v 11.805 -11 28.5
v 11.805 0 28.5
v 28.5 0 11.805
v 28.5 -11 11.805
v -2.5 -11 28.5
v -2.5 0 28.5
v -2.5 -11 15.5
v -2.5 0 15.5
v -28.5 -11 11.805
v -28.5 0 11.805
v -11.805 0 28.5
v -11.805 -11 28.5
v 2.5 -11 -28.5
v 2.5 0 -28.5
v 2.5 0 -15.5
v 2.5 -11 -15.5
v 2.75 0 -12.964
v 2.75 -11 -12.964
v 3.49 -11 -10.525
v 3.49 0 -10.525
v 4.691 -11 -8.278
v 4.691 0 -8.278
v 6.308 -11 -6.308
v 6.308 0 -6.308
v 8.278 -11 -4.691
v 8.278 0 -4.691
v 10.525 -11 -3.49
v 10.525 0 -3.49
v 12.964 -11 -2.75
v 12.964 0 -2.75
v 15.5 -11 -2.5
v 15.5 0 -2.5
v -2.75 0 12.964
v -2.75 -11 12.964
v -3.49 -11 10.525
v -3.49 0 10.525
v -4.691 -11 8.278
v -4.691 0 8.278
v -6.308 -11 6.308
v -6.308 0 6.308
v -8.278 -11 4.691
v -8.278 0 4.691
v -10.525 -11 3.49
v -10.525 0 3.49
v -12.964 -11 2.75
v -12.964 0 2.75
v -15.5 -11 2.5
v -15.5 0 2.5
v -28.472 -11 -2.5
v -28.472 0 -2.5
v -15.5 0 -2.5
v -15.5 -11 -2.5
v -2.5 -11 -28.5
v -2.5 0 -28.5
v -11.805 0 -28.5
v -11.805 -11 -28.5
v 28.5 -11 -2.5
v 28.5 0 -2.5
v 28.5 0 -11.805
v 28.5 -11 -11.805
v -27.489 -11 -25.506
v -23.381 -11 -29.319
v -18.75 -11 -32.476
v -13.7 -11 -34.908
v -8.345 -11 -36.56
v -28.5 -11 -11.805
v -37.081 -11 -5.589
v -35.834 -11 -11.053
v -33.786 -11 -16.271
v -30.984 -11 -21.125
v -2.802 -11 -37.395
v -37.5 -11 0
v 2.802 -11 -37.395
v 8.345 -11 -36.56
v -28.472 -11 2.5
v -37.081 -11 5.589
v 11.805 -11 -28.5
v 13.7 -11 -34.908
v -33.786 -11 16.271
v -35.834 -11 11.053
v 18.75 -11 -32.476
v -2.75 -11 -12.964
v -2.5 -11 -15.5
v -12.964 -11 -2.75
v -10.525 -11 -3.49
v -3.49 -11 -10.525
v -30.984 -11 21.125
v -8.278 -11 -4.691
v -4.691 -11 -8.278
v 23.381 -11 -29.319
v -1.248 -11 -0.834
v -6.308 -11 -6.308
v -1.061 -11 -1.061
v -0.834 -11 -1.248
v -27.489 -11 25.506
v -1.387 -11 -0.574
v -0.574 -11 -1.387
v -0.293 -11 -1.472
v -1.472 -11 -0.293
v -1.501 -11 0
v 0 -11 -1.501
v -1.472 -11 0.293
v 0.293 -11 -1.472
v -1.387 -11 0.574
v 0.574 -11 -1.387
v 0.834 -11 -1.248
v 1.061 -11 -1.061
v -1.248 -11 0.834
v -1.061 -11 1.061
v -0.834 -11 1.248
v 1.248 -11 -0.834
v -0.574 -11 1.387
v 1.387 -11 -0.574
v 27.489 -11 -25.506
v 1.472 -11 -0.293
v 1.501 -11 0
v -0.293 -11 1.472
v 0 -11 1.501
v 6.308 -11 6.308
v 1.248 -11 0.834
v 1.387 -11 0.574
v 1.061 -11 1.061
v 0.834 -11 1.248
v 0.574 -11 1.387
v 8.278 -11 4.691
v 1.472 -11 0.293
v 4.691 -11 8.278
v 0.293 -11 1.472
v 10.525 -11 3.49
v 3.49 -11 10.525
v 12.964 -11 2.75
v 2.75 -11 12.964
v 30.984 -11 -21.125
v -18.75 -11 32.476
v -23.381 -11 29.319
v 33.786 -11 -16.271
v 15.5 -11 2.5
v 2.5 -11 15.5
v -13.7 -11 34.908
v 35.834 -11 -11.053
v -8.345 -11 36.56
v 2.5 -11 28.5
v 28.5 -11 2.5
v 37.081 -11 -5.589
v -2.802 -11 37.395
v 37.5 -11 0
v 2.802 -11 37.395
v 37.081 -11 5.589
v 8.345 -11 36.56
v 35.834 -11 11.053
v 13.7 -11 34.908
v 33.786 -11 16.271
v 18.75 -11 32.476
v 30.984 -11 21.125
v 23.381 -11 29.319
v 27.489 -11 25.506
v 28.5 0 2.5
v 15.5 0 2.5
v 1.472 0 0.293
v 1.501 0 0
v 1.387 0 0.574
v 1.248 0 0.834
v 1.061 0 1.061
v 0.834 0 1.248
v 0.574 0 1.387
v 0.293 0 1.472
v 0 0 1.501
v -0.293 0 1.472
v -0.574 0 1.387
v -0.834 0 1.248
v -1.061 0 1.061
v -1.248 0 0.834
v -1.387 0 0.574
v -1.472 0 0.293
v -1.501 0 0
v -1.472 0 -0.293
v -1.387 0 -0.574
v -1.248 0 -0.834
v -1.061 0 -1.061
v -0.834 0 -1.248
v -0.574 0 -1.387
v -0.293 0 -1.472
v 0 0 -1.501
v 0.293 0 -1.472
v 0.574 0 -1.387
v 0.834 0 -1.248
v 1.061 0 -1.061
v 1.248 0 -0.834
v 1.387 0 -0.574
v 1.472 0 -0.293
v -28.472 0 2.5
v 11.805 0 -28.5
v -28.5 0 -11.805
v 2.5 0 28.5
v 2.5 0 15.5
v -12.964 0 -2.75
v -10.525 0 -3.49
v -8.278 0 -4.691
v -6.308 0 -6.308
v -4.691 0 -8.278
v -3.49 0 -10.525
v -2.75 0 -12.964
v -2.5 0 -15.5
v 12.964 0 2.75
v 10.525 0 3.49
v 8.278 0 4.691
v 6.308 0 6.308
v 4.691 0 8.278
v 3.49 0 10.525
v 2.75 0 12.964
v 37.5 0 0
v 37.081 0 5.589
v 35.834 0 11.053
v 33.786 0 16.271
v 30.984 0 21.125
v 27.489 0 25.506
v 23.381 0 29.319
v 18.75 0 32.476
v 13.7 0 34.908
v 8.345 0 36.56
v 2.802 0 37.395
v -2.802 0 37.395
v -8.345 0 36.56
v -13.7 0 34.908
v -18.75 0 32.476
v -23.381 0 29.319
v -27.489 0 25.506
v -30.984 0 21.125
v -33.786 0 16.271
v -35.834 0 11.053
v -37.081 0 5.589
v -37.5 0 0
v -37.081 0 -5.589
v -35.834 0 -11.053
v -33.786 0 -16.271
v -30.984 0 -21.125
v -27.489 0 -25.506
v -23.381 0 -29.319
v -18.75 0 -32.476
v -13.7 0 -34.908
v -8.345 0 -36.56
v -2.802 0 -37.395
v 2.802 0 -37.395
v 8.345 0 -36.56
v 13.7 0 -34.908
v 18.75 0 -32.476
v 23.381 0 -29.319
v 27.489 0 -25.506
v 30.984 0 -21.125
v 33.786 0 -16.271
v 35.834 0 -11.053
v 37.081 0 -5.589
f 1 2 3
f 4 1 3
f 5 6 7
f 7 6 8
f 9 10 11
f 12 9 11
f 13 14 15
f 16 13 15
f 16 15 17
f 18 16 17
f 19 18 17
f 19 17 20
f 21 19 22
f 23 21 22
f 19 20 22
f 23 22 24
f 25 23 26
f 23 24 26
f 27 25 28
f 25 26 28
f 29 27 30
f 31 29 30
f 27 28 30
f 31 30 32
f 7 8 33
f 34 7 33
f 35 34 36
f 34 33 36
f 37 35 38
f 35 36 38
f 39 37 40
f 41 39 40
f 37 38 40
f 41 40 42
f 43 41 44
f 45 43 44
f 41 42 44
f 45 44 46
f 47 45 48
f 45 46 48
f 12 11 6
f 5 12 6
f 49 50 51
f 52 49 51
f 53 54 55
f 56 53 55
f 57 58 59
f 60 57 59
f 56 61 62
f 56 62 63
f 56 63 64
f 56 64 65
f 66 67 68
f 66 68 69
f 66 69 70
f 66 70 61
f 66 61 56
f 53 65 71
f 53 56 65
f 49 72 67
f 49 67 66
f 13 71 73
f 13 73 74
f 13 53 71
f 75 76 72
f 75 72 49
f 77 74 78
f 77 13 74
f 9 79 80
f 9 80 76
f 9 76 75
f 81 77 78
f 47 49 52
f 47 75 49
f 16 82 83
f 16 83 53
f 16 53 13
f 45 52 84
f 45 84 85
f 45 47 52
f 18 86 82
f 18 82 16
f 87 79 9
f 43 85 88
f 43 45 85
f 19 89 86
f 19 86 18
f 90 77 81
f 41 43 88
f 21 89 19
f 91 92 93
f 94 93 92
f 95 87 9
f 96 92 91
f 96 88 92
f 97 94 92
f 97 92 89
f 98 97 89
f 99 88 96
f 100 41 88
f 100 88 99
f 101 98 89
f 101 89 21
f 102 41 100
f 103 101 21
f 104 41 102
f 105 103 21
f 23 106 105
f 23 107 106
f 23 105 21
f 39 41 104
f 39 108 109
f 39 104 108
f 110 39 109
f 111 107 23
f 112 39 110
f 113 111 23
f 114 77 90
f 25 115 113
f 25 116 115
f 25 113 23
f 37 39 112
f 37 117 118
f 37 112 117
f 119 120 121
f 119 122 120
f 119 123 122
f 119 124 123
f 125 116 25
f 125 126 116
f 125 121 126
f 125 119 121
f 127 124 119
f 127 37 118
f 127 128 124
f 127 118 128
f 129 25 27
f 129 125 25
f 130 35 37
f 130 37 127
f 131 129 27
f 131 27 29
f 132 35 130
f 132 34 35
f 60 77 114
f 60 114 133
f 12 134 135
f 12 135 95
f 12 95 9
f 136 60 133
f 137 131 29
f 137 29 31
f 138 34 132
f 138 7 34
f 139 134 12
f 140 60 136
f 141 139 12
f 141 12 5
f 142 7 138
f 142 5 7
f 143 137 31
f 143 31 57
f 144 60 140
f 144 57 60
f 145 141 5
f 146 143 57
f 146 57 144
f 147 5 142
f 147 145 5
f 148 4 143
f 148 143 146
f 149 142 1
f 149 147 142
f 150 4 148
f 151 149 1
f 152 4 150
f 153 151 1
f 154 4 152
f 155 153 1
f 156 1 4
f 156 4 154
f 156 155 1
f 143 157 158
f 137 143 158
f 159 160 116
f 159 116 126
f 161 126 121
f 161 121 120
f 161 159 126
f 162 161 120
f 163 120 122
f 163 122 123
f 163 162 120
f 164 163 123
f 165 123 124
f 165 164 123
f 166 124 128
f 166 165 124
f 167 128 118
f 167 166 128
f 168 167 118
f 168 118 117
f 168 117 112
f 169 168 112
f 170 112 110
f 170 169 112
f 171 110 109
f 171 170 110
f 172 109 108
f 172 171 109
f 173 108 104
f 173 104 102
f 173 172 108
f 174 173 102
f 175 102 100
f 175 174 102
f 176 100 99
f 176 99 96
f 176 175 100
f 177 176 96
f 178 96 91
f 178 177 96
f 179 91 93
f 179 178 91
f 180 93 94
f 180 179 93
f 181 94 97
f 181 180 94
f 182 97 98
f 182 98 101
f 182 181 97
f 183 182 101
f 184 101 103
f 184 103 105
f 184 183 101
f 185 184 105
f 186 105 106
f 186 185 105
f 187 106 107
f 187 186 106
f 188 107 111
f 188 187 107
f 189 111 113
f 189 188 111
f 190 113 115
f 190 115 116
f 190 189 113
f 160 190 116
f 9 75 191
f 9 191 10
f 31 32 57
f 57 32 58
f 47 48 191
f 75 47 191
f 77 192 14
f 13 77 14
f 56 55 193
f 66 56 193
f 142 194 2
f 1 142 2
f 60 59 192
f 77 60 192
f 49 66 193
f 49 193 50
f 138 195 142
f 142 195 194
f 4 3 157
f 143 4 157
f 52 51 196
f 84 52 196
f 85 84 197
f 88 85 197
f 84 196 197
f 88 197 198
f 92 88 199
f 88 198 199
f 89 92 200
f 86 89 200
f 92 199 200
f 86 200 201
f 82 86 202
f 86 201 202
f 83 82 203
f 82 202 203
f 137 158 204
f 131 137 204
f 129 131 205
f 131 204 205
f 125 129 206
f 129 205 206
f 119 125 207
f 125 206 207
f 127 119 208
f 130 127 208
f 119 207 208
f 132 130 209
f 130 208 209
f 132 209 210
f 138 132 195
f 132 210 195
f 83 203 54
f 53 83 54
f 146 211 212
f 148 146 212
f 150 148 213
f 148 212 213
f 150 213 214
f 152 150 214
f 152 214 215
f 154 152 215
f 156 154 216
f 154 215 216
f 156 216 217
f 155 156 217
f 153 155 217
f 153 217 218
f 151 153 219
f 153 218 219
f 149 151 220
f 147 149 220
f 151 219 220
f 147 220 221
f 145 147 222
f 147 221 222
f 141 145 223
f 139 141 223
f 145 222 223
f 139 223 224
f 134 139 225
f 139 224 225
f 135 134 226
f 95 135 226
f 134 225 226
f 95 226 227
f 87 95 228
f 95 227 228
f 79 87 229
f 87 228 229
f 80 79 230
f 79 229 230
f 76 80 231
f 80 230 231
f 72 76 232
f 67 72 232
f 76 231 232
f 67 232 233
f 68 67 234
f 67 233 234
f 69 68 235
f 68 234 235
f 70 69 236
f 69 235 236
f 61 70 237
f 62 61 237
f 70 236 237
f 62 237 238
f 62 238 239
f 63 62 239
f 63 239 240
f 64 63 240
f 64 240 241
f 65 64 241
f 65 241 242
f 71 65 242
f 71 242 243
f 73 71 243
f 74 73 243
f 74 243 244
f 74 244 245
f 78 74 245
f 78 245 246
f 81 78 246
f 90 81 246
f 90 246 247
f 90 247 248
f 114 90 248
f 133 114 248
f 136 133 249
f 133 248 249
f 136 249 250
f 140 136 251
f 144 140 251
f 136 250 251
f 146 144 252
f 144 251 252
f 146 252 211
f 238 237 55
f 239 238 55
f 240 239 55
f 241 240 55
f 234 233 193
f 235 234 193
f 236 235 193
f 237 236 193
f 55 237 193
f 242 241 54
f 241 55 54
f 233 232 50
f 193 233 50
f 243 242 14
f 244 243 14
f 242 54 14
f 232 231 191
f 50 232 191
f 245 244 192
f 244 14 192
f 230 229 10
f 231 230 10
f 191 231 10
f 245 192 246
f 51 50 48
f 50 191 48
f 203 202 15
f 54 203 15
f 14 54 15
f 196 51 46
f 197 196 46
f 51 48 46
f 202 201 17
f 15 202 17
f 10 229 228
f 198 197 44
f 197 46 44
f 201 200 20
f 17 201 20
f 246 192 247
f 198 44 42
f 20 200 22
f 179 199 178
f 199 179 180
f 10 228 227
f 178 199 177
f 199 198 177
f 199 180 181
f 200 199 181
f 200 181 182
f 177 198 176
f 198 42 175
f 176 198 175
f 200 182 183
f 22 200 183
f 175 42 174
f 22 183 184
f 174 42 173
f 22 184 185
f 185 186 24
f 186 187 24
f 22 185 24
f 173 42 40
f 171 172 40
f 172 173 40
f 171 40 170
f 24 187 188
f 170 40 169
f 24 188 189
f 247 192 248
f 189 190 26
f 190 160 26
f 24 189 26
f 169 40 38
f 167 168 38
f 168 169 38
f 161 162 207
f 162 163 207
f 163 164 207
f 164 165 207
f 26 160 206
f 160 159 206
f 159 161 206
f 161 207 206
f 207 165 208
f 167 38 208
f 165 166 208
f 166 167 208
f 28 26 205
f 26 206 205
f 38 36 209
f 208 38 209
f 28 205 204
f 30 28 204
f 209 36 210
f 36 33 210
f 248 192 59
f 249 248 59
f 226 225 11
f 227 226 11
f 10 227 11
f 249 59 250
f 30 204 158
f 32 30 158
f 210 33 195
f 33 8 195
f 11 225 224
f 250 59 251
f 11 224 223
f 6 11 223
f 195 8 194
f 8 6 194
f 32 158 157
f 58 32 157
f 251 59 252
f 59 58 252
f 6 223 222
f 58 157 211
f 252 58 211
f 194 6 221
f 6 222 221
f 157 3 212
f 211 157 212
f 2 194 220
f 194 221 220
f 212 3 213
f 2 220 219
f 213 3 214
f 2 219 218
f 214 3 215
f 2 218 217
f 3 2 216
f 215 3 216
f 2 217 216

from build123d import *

# Parameters (mm, degrees)
F0_R     = 37.5
F0_R_2   = 1.500821
F1_DEPTH = 11


with BuildPart() as f1:
    # F0 (on Front) → F1 (new body)
    with BuildSketch(Plane.XZ):
        Circle(F0_R)
        with BuildLine():
            Line((-28.472292, -2.5), (-15.499999, -2.500001))
            ThreePointArc((-15.499999, -2.500001), (-6.307613, -6.307613), (-2.500001, -15.499999))
            Line((-2.500001, -15.499999), (-2.500189, -28.5))
            Line((-2.500189, -28.5), (-11.805087, -28.5))
            Line((-11.805087, -28.5), (-28.5, -11.805087))
            Line((-28.5, -11.805087), (-28.472292, -2.5))
        make_face(mode=Mode.SUBTRACT)
        with BuildLine():
            ThreePointArc((2.500001, -15.499999), (6.307613, -6.307612), (15.500001, -2.5))
            Line((15.500001, -2.5), (28.5, -2.5))
            Line((28.5, -2.5), (28.5, -11.805087))
            Line((28.5, -11.805087), (11.805087, -28.5))
            Line((11.805087, -28.5), (2.500189, -28.5))
            Line((2.500189, -28.5), (2.500001, -15.499999))
        make_face(mode=Mode.SUBTRACT)
        with BuildLine():
            ThreePointArc((-2.499999, 15.500001), (-6.307611, 6.307612), (-15.499999, 2.5))
            Line((-15.499999, 2.5), (-28.472292, 2.5))
            Line((-28.472292, 2.5), (-28.5, 11.805087))
            Line((-28.5, 11.805087), (-11.805087, 28.5))
            Line((-11.805087, 28.5), (-2.499811, 28.5))
            Line((-2.499811, 28.5), (-2.499999, 15.500001))
        make_face(mode=Mode.SUBTRACT)
        Circle(F0_R_2, mode=Mode.SUBTRACT)
        with BuildLine():
            Line((28.5, 2.5), (15.500001, 2.5))
            ThreePointArc((15.500001, 2.5), (6.307612, 6.307612), (2.5, 15.500001))
            Line((2.5, 15.500001), (2.499811, 28.5))
            Line((2.499811, 28.5), (11.805087, 28.5))
            Line((11.805087, 28.5), (28.5, 11.805087))
            Line((28.5, 11.805087), (28.5, 2.5))
        make_face(mode=Mode.SUBTRACT)
    extrude(amount=F1_DEPTH)


solid = f1.part
